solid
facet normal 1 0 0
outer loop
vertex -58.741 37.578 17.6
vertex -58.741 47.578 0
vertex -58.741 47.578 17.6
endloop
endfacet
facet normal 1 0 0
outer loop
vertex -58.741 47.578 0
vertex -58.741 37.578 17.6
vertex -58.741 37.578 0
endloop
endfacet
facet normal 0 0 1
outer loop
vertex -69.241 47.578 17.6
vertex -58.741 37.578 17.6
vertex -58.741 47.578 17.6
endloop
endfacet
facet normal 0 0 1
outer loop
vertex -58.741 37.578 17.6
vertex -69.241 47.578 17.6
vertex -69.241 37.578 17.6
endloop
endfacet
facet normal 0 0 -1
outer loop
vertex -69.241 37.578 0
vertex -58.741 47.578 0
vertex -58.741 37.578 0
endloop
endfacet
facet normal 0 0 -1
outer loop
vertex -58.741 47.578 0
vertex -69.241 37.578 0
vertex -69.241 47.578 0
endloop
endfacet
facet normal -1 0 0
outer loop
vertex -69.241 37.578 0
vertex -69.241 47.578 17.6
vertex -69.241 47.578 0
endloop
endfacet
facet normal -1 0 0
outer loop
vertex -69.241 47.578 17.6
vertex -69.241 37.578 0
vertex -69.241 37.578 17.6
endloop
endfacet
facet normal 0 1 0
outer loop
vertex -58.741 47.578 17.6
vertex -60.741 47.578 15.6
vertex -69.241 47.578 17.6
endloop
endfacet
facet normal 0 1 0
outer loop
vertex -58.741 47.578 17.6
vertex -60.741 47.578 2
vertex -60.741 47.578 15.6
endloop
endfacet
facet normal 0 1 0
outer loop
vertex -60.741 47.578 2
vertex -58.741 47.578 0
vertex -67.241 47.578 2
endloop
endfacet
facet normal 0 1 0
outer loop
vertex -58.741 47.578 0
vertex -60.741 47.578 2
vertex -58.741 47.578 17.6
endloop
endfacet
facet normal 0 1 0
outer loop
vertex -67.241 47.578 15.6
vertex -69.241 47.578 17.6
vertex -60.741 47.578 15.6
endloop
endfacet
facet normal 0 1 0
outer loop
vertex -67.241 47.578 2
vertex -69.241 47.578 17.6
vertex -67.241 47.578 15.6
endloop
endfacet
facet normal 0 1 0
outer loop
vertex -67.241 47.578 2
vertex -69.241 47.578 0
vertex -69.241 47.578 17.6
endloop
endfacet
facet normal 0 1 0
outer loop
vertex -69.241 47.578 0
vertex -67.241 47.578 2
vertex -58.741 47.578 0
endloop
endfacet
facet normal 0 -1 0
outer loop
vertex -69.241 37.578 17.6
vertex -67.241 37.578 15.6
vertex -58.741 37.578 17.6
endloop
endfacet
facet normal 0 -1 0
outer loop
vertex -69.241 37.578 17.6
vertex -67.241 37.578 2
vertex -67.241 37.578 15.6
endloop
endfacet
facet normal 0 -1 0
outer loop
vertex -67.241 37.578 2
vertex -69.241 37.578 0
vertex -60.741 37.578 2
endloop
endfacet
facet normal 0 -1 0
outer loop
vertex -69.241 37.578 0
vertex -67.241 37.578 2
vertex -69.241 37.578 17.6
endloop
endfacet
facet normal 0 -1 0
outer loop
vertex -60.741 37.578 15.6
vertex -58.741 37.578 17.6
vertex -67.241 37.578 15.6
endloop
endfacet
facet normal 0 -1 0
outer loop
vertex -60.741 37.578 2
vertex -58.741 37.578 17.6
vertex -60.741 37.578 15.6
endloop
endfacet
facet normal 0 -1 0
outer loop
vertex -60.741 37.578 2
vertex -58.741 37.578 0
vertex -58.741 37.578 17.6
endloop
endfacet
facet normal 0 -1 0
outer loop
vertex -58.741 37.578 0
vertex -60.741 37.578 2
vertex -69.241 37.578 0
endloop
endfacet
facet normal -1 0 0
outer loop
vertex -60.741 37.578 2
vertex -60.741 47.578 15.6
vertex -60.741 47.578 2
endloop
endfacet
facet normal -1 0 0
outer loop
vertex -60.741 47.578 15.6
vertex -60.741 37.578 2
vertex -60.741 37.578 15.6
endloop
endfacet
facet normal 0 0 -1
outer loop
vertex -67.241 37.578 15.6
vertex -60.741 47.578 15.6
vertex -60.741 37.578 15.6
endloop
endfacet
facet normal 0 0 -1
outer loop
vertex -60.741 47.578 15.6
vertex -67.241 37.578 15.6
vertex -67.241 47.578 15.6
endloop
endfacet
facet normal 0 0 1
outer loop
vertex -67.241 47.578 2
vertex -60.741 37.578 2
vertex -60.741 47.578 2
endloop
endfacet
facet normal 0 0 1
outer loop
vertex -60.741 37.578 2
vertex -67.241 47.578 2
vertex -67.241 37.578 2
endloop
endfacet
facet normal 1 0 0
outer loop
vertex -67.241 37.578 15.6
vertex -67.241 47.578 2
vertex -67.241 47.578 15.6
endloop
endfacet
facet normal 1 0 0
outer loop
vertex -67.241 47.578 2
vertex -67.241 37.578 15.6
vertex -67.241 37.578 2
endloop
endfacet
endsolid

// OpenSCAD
difference () {
  translate ([-63.991374938052125, 42.578110478055464, 8.8]) {
    cube ([10.5, 10.0, 17.6], center=true);
  }
  translate ([-63.991374938052125, 42.578110478055464, 8.8]) {
    cube ([6.5, 10.0, 13.6], center=true);
  }
}
